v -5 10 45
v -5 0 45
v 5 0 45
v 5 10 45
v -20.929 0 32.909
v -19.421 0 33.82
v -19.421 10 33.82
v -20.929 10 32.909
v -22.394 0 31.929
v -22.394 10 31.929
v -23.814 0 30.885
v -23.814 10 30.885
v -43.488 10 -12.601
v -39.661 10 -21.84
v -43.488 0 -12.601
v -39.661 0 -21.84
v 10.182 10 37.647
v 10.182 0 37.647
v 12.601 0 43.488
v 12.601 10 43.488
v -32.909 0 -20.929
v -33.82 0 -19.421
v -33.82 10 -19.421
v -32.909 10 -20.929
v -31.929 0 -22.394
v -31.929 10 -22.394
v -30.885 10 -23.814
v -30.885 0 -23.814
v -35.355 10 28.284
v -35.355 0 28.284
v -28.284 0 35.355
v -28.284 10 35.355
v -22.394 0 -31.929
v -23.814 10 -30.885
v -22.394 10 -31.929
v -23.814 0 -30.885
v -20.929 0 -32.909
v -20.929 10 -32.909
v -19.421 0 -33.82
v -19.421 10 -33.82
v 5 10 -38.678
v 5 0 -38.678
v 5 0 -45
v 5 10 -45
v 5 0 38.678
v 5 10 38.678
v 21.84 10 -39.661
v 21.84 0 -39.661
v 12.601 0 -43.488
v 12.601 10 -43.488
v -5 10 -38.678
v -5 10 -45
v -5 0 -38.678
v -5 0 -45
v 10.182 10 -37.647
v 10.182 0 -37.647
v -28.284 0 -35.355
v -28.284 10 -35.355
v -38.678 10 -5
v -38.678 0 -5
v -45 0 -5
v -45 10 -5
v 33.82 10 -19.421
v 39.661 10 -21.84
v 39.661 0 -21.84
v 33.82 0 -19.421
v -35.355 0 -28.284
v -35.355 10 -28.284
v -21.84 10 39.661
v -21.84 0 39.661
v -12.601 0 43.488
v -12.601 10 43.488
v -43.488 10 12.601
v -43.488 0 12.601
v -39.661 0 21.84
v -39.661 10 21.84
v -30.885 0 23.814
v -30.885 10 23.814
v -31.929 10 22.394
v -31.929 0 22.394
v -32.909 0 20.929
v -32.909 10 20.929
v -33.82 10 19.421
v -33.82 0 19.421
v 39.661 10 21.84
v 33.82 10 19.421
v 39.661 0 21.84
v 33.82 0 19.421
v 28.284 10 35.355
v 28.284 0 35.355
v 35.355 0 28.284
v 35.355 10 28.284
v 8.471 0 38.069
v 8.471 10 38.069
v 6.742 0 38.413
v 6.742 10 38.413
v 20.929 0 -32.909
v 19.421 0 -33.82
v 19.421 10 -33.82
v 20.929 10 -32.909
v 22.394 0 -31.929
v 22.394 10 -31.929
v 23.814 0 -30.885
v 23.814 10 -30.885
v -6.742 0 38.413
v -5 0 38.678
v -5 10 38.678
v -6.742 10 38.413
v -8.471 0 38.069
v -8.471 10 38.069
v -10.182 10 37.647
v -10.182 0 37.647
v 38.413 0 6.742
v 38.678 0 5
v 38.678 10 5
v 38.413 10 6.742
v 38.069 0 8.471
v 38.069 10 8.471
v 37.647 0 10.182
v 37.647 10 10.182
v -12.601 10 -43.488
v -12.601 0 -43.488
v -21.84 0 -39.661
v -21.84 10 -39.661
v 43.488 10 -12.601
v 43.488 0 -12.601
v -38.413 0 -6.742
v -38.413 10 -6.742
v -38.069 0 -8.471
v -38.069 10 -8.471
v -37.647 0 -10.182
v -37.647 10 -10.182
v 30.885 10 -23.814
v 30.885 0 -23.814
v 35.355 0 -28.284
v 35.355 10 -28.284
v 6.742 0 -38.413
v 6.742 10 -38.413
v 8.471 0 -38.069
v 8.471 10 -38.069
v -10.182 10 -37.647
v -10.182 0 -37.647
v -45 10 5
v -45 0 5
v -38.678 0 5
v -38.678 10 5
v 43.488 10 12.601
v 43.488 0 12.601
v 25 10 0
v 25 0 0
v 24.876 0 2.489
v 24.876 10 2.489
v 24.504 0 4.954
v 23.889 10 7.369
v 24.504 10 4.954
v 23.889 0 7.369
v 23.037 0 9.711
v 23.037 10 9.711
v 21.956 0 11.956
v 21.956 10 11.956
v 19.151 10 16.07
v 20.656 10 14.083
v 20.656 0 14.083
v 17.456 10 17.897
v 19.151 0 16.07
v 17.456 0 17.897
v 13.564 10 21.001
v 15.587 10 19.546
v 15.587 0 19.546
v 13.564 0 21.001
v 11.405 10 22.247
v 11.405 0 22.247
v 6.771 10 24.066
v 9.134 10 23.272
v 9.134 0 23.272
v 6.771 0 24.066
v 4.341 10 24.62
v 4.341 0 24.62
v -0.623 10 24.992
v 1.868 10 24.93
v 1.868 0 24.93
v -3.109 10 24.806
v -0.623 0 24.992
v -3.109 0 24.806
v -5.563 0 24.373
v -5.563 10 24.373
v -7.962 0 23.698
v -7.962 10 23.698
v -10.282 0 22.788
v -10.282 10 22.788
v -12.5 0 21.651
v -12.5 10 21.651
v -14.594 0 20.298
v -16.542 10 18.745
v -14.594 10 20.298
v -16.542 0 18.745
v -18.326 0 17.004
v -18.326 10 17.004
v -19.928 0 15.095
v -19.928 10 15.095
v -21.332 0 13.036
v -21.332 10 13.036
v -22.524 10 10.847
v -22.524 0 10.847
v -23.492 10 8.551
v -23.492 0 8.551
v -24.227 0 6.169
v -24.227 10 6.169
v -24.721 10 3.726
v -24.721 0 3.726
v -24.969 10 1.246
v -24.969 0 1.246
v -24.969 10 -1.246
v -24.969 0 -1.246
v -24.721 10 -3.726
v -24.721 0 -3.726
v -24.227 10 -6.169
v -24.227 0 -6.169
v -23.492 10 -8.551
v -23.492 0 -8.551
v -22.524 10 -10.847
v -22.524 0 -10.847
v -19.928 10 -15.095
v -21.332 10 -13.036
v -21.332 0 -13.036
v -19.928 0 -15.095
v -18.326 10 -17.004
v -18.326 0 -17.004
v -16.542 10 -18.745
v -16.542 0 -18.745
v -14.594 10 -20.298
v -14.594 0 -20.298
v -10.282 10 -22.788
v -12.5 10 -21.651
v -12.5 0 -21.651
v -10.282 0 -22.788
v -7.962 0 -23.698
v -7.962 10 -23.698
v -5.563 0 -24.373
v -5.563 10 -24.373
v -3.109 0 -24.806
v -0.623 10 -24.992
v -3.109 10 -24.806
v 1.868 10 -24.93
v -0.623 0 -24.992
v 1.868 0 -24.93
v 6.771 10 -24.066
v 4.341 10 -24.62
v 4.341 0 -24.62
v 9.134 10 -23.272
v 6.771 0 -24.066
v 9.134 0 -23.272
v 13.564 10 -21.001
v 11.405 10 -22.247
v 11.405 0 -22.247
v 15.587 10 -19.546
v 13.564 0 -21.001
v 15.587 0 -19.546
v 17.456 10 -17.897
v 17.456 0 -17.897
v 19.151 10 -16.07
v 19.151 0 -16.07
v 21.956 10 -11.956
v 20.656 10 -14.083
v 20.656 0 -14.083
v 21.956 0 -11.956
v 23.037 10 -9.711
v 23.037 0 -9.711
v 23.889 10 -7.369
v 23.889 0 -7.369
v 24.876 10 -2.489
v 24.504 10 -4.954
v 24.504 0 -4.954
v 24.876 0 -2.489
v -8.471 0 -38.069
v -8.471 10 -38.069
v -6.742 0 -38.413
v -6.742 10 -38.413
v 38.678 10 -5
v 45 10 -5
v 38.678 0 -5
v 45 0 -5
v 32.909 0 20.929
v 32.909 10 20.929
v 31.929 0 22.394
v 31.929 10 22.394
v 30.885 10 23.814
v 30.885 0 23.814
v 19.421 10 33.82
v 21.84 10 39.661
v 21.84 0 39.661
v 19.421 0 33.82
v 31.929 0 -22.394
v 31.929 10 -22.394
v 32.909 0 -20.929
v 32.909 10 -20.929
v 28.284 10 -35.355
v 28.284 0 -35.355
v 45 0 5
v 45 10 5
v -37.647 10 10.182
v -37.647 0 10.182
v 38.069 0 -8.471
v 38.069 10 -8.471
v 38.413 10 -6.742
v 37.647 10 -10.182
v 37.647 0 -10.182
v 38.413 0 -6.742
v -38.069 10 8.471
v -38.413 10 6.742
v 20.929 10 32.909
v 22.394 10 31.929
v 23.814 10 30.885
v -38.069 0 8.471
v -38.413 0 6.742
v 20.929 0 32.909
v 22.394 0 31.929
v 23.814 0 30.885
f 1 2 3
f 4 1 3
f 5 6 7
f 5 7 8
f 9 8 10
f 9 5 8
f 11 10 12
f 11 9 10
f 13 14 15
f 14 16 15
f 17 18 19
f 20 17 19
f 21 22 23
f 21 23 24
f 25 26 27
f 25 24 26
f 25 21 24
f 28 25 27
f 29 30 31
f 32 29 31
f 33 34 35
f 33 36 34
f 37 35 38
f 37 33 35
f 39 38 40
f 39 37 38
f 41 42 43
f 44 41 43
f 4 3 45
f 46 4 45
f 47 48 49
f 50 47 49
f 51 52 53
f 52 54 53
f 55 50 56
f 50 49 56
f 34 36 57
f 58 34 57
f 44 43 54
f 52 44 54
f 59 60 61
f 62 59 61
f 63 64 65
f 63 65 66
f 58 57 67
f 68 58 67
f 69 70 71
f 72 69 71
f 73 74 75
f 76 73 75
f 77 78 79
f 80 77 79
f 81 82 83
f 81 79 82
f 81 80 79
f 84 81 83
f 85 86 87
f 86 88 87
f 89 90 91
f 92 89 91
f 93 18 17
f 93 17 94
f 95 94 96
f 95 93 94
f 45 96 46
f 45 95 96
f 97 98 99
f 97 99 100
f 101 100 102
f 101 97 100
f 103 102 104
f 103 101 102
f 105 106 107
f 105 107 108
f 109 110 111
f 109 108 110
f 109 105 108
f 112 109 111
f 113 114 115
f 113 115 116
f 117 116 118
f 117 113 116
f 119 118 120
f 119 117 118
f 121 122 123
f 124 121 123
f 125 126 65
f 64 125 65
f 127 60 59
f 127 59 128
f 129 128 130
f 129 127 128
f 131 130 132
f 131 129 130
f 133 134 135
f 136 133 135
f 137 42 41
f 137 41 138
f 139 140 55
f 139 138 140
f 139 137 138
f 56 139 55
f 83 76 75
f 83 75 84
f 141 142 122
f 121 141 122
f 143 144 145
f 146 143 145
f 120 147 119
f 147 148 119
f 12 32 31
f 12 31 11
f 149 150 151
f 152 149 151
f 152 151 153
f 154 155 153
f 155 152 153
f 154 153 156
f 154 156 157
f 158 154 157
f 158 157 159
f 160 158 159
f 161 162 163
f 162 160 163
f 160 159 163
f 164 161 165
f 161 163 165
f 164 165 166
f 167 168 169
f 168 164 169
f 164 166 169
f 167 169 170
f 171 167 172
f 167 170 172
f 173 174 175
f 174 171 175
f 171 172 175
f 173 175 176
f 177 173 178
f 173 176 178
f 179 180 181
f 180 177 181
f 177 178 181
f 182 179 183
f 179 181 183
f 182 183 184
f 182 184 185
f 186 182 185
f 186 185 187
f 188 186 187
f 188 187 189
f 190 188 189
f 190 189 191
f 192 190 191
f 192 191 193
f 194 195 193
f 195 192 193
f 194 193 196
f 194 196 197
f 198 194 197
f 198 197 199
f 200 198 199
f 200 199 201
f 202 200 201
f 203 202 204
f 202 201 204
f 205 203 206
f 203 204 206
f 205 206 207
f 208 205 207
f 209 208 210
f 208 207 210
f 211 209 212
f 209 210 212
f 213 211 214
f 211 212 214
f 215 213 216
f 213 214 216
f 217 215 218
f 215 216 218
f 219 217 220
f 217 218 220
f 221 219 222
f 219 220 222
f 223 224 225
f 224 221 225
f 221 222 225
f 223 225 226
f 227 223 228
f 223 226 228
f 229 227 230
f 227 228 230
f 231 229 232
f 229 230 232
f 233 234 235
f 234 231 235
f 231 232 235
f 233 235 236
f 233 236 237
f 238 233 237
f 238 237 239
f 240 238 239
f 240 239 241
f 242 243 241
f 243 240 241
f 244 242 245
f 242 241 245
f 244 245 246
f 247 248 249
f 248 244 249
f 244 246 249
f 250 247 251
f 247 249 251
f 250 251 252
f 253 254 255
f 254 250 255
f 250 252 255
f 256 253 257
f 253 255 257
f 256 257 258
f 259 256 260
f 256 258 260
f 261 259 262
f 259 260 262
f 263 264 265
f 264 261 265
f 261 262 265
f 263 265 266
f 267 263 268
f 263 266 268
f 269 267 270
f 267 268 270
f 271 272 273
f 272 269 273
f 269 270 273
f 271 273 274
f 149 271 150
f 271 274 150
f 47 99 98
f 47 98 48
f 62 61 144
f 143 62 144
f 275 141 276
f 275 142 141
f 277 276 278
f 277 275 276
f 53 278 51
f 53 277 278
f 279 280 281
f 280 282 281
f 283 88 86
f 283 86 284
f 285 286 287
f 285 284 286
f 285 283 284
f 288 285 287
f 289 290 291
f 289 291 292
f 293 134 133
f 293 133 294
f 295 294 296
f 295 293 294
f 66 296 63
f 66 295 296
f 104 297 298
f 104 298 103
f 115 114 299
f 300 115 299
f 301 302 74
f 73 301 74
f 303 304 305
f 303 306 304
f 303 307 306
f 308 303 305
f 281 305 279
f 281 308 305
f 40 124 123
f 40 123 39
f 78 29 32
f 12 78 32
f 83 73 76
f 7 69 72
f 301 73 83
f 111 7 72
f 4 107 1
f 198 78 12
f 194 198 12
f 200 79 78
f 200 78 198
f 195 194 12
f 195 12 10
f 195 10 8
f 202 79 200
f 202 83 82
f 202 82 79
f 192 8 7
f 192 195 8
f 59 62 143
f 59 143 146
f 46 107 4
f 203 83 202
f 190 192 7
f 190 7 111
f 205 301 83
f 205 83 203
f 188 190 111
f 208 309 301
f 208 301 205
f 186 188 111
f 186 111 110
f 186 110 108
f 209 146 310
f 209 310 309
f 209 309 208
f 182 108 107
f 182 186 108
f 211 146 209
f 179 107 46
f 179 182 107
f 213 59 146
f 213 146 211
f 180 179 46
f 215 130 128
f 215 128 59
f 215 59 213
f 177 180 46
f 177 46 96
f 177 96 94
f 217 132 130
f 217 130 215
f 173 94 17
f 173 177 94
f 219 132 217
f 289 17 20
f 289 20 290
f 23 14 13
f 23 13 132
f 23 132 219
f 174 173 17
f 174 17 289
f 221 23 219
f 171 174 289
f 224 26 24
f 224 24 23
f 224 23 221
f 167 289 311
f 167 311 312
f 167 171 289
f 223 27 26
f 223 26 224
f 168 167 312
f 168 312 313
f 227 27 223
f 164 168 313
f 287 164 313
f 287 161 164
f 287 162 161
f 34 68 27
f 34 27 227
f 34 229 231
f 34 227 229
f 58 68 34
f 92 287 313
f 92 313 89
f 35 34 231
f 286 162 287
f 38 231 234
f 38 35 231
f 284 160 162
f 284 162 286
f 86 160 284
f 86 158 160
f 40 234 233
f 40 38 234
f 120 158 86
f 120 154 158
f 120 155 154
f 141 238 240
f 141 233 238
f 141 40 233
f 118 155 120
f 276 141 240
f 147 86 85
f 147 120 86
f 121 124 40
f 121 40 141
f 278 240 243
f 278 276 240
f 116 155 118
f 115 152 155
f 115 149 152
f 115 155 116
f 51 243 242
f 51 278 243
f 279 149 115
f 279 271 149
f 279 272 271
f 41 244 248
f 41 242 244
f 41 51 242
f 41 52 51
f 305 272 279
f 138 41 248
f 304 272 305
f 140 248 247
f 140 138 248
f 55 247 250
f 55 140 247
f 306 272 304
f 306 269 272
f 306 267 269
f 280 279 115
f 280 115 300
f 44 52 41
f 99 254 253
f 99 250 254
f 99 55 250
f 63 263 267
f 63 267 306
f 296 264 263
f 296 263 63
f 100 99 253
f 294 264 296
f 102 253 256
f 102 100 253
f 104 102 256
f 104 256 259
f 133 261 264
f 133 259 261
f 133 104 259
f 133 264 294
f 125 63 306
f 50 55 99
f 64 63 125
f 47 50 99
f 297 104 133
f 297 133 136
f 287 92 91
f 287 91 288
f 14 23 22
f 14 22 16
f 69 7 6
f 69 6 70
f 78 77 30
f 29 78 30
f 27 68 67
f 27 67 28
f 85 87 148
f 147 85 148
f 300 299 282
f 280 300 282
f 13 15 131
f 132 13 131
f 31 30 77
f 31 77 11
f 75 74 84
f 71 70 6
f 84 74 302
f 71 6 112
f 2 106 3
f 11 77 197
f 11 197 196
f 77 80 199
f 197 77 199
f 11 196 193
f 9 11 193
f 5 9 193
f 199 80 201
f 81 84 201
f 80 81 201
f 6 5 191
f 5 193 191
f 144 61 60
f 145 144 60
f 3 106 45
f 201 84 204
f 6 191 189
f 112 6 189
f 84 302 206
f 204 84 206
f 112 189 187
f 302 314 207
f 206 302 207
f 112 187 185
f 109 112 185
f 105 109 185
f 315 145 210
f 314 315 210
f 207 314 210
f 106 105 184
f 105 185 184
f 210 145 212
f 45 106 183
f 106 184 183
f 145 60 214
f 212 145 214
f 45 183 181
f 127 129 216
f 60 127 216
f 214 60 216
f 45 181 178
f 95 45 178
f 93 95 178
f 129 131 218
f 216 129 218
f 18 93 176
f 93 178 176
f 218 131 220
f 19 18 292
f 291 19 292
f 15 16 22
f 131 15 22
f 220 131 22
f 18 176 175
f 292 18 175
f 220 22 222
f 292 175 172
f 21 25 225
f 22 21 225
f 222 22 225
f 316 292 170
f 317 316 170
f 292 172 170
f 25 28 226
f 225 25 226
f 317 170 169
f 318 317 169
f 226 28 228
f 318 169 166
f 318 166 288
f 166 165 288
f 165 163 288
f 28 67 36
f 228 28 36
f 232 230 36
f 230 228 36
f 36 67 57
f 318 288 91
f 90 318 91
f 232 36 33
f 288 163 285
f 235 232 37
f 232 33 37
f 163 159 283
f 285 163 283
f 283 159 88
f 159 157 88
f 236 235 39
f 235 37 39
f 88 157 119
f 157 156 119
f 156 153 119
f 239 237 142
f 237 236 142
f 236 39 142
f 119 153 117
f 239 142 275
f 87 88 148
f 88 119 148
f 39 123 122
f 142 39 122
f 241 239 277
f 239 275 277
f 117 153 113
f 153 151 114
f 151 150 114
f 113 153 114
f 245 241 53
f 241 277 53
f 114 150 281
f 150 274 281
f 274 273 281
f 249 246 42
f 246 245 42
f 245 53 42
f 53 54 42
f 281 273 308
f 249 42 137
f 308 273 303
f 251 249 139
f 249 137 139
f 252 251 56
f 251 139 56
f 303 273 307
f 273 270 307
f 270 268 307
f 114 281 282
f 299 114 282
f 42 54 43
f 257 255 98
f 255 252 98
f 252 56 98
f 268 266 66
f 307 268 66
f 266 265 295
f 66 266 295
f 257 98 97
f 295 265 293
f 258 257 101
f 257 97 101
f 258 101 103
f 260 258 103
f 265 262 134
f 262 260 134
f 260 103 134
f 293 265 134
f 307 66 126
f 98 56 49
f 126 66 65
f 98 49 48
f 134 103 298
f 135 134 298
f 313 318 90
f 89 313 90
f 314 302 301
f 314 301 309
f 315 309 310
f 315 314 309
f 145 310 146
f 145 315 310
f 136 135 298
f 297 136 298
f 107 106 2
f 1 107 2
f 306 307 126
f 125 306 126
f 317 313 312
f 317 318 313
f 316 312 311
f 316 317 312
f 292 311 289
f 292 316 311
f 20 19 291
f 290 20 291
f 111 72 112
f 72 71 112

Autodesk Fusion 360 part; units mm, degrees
sketch "Sketch1" plane through (0, 0, 0) normal (0, 1, 0) x (1, 0, 0)
  circle A0 centre (0, 0) radius 25
  circle A1 centre (0, 0) radius 39
  line L0 (5, 45) -> (-5, 45)
  line L1 (-5, -45) -> (5, -45)
  line L2 (-5, 45) -> (-5, 38.6782)
  line L3 (-5, -38.6782) -> (-5, -45)
  line L4 (-5, 45) -> (-4.9694, 44.7248) construction
  line L5 (4.9694, -44.7248) -> (5, -45) construction
  line L6 (5, 45) -> (4.9694, 44.7248) construction
  line L7 (-4.9694, -44.7248) -> (-5, -45) construction
  line L8 (5, -45) -> (5, -38.6782)
  line L9 (5, 38.6782) -> (5, 45)
  line L10 (-10.1821, 37.6474) -> (-12.6014, 43.488)
  line L11 (-12.6014, 43.488) -> (-21.8402, 39.6612)
  line L12 (-21.8402, 39.6612) -> (-19.4209, 33.8205)
  line L13 (21.8402, -39.6612) -> (19.4209, -33.8205)
  line L14 (12.6014, -43.488) -> (21.8402, -39.6612)
  line L15 (10.1821, -37.6474) -> (12.6014, -43.488)
  line L16 (-23.8141, 30.8851) -> (-28.2843, 35.3553)
  line L17 (-28.2843, 35.3553) -> (-35.3553, 28.2843)
  line L18 (-35.3553, 28.2843) -> (-30.8851, 23.8141)
  line L19 (35.3553, -28.2843) -> (30.8851, -23.8141)
  line L20 (28.2843, -35.3553) -> (35.3553, -28.2843)
  line L21 (23.8141, -30.8851) -> (28.2843, -35.3553)
  line L22 (-33.8205, 19.4209) -> (-39.6612, 21.8402)
  line L23 (-39.6612, 21.8402) -> (-43.488, 12.6014)
  line L24 (-43.488, 12.6014) -> (-37.6474, 10.1821)
  line L25 (43.488, -12.6014) -> (37.6474, -10.1821)
  line L26 (39.6612, -21.8402) -> (43.488, -12.6014)
  line L27 (33.8205, -19.4209) -> (39.6612, -21.8402)
  line L28 (-38.6782, 5) -> (-45, 5)
  line L29 (-45, 5) -> (-45, -5)
  line L30 (-45, -5) -> (-38.6782, -5)
  line L31 (45, 5) -> (38.6782, 5)
  line L32 (45, -5) -> (45, 5)
  line L33 (38.6782, -5) -> (45, -5)
  line L34 (-37.6474, -10.1821) -> (-43.488, -12.6014)
  line L35 (-43.488, -12.6014) -> (-39.6612, -21.8402)
  line L36 (-39.6612, -21.8402) -> (-33.8205, -19.4209)
  line L37 (39.6612, 21.8402) -> (33.8205, 19.4209)
  line L38 (43.488, 12.6014) -> (39.6612, 21.8402)
  line L39 (37.6474, 10.1821) -> (43.488, 12.6014)
  line L40 (-30.8851, -23.8141) -> (-35.3553, -28.2843)
  line L41 (-35.3553, -28.2843) -> (-28.2843, -35.3553)
  line L42 (-28.2843, -35.3553) -> (-23.8141, -30.8851)
  line L43 (28.2843, 35.3553) -> (23.8141, 30.8851)
  line L44 (35.3553, 28.2843) -> (28.2843, 35.3553)
  line L45 (30.8851, 23.8141) -> (35.3553, 28.2843)
  line L46 (-19.4209, -33.8205) -> (-21.8402, -39.6612)
  line L47 (-21.8402, -39.6612) -> (-12.6014, -43.488)
  line L48 (-12.6014, -43.488) -> (-10.1821, -37.6474)
  line L49 (12.6014, 43.488) -> (10.1821, 37.6474)
  line L50 (21.8402, 39.6612) -> (12.6014, 43.488)
  line L51 (19.4209, 33.8205) -> (21.8402, 39.6612)
  line L52 (-5, -38.6782) -> (-5, -45)
  line L53 (-5, -45) -> (5, -45)
  line L54 (5, -45) -> (5, -38.6782)
  line L55 (-5, 45) -> (-5, 38.6782)
  line L56 (5, 45) -> (-5, 45)
  line L57 (5, 38.6782) -> (5, 45)
  line L58 (10.1821, -37.6474) -> (12.6014, -43.488)
  line L59 (12.6014, -43.488) -> (21.8402, -39.6612)
  line L60 (21.8402, -39.6612) -> (19.4209, -33.8205)
  line L61 (-21.8402, 39.6612) -> (-19.4209, 33.8205)
  line L62 (-12.6014, 43.488) -> (-21.8402, 39.6612)
  line L63 (-10.1821, 37.6474) -> (-12.6014, 43.488)
  line L64 (23.8141, -30.8851) -> (28.2843, -35.3553)
  line L65 (28.2843, -35.3553) -> (35.3553, -28.2843)
  line L66 (35.3553, -28.2843) -> (30.8851, -23.8141)
  line L67 (-35.3553, 28.2843) -> (-30.8851, 23.8141)
  line L68 (-28.2843, 35.3553) -> (-35.3553, 28.2843)
  line L69 (-23.8141, 30.8851) -> (-28.2843, 35.3553)
  line L70 (33.8205, -19.4209) -> (39.6612, -21.8402)
  line L71 (39.6612, -21.8402) -> (43.488, -12.6014)
  line L72 (43.488, -12.6014) -> (37.6474, -10.1821)
  line L73 (-43.488, 12.6014) -> (-37.6474, 10.1821)
  line L74 (-39.6612, 21.8402) -> (-43.488, 12.6014)
  line L75 (-33.8205, 19.4209) -> (-39.6612, 21.8402)
  line L76 (38.6782, -5) -> (45, -5)
  line L77 (45, -5) -> (45, 5)
  line L78 (45, 5) -> (38.6782, 5)
  line L79 (-45, -5) -> (-38.6782, -5)
  line L80 (-45, 5) -> (-45, -5)
  line L81 (-38.6782, 5) -> (-45, 5)
  line L82 (37.6474, 10.1821) -> (43.488, 12.6014)
  line L83 (43.488, 12.6014) -> (39.6612, 21.8402)
  line L84 (39.6612, 21.8402) -> (33.8205, 19.4209)
  line L85 (-39.6612, -21.8402) -> (-33.8205, -19.4209)
  line L86 (-43.488, -12.6014) -> (-39.6612, -21.8402)
  line L87 (-37.6474, -10.1821) -> (-43.488, -12.6014)
  line L88 (30.8851, 23.8141) -> (35.3553, 28.2843)
  line L89 (35.3553, 28.2843) -> (28.2843, 35.3553)
  line L90 (28.2843, 35.3553) -> (23.8141, 30.8851)
  line L91 (-28.2843, -35.3553) -> (-23.8141, -30.8851)
  line L92 (-35.3553, -28.2843) -> (-28.2843, -35.3553)
  line L93 (-30.8851, -23.8141) -> (-35.3553, -28.2843)
  line L94 (19.4209, 33.8205) -> (21.8402, 39.6612)
  line L95 (21.8402, 39.6612) -> (12.6014, 43.488)
  line L96 (12.6014, 43.488) -> (10.1821, 37.6474)
  line L97 (-12.6014, -43.488) -> (-10.1821, -37.6474)
  line L98 (-21.8402, -39.6612) -> (-12.6014, -43.488)
  line L99 (-19.4209, -33.8205) -> (-21.8402, -39.6612)
  dimension "d1" = 50
  dimension "d3" = 78
  dimension "d4" = 10
  dimension "d5" = 90
  dimension "d7" = 360
extrude "Extrude1" add sketch "Sketch1" along normal blind 10
